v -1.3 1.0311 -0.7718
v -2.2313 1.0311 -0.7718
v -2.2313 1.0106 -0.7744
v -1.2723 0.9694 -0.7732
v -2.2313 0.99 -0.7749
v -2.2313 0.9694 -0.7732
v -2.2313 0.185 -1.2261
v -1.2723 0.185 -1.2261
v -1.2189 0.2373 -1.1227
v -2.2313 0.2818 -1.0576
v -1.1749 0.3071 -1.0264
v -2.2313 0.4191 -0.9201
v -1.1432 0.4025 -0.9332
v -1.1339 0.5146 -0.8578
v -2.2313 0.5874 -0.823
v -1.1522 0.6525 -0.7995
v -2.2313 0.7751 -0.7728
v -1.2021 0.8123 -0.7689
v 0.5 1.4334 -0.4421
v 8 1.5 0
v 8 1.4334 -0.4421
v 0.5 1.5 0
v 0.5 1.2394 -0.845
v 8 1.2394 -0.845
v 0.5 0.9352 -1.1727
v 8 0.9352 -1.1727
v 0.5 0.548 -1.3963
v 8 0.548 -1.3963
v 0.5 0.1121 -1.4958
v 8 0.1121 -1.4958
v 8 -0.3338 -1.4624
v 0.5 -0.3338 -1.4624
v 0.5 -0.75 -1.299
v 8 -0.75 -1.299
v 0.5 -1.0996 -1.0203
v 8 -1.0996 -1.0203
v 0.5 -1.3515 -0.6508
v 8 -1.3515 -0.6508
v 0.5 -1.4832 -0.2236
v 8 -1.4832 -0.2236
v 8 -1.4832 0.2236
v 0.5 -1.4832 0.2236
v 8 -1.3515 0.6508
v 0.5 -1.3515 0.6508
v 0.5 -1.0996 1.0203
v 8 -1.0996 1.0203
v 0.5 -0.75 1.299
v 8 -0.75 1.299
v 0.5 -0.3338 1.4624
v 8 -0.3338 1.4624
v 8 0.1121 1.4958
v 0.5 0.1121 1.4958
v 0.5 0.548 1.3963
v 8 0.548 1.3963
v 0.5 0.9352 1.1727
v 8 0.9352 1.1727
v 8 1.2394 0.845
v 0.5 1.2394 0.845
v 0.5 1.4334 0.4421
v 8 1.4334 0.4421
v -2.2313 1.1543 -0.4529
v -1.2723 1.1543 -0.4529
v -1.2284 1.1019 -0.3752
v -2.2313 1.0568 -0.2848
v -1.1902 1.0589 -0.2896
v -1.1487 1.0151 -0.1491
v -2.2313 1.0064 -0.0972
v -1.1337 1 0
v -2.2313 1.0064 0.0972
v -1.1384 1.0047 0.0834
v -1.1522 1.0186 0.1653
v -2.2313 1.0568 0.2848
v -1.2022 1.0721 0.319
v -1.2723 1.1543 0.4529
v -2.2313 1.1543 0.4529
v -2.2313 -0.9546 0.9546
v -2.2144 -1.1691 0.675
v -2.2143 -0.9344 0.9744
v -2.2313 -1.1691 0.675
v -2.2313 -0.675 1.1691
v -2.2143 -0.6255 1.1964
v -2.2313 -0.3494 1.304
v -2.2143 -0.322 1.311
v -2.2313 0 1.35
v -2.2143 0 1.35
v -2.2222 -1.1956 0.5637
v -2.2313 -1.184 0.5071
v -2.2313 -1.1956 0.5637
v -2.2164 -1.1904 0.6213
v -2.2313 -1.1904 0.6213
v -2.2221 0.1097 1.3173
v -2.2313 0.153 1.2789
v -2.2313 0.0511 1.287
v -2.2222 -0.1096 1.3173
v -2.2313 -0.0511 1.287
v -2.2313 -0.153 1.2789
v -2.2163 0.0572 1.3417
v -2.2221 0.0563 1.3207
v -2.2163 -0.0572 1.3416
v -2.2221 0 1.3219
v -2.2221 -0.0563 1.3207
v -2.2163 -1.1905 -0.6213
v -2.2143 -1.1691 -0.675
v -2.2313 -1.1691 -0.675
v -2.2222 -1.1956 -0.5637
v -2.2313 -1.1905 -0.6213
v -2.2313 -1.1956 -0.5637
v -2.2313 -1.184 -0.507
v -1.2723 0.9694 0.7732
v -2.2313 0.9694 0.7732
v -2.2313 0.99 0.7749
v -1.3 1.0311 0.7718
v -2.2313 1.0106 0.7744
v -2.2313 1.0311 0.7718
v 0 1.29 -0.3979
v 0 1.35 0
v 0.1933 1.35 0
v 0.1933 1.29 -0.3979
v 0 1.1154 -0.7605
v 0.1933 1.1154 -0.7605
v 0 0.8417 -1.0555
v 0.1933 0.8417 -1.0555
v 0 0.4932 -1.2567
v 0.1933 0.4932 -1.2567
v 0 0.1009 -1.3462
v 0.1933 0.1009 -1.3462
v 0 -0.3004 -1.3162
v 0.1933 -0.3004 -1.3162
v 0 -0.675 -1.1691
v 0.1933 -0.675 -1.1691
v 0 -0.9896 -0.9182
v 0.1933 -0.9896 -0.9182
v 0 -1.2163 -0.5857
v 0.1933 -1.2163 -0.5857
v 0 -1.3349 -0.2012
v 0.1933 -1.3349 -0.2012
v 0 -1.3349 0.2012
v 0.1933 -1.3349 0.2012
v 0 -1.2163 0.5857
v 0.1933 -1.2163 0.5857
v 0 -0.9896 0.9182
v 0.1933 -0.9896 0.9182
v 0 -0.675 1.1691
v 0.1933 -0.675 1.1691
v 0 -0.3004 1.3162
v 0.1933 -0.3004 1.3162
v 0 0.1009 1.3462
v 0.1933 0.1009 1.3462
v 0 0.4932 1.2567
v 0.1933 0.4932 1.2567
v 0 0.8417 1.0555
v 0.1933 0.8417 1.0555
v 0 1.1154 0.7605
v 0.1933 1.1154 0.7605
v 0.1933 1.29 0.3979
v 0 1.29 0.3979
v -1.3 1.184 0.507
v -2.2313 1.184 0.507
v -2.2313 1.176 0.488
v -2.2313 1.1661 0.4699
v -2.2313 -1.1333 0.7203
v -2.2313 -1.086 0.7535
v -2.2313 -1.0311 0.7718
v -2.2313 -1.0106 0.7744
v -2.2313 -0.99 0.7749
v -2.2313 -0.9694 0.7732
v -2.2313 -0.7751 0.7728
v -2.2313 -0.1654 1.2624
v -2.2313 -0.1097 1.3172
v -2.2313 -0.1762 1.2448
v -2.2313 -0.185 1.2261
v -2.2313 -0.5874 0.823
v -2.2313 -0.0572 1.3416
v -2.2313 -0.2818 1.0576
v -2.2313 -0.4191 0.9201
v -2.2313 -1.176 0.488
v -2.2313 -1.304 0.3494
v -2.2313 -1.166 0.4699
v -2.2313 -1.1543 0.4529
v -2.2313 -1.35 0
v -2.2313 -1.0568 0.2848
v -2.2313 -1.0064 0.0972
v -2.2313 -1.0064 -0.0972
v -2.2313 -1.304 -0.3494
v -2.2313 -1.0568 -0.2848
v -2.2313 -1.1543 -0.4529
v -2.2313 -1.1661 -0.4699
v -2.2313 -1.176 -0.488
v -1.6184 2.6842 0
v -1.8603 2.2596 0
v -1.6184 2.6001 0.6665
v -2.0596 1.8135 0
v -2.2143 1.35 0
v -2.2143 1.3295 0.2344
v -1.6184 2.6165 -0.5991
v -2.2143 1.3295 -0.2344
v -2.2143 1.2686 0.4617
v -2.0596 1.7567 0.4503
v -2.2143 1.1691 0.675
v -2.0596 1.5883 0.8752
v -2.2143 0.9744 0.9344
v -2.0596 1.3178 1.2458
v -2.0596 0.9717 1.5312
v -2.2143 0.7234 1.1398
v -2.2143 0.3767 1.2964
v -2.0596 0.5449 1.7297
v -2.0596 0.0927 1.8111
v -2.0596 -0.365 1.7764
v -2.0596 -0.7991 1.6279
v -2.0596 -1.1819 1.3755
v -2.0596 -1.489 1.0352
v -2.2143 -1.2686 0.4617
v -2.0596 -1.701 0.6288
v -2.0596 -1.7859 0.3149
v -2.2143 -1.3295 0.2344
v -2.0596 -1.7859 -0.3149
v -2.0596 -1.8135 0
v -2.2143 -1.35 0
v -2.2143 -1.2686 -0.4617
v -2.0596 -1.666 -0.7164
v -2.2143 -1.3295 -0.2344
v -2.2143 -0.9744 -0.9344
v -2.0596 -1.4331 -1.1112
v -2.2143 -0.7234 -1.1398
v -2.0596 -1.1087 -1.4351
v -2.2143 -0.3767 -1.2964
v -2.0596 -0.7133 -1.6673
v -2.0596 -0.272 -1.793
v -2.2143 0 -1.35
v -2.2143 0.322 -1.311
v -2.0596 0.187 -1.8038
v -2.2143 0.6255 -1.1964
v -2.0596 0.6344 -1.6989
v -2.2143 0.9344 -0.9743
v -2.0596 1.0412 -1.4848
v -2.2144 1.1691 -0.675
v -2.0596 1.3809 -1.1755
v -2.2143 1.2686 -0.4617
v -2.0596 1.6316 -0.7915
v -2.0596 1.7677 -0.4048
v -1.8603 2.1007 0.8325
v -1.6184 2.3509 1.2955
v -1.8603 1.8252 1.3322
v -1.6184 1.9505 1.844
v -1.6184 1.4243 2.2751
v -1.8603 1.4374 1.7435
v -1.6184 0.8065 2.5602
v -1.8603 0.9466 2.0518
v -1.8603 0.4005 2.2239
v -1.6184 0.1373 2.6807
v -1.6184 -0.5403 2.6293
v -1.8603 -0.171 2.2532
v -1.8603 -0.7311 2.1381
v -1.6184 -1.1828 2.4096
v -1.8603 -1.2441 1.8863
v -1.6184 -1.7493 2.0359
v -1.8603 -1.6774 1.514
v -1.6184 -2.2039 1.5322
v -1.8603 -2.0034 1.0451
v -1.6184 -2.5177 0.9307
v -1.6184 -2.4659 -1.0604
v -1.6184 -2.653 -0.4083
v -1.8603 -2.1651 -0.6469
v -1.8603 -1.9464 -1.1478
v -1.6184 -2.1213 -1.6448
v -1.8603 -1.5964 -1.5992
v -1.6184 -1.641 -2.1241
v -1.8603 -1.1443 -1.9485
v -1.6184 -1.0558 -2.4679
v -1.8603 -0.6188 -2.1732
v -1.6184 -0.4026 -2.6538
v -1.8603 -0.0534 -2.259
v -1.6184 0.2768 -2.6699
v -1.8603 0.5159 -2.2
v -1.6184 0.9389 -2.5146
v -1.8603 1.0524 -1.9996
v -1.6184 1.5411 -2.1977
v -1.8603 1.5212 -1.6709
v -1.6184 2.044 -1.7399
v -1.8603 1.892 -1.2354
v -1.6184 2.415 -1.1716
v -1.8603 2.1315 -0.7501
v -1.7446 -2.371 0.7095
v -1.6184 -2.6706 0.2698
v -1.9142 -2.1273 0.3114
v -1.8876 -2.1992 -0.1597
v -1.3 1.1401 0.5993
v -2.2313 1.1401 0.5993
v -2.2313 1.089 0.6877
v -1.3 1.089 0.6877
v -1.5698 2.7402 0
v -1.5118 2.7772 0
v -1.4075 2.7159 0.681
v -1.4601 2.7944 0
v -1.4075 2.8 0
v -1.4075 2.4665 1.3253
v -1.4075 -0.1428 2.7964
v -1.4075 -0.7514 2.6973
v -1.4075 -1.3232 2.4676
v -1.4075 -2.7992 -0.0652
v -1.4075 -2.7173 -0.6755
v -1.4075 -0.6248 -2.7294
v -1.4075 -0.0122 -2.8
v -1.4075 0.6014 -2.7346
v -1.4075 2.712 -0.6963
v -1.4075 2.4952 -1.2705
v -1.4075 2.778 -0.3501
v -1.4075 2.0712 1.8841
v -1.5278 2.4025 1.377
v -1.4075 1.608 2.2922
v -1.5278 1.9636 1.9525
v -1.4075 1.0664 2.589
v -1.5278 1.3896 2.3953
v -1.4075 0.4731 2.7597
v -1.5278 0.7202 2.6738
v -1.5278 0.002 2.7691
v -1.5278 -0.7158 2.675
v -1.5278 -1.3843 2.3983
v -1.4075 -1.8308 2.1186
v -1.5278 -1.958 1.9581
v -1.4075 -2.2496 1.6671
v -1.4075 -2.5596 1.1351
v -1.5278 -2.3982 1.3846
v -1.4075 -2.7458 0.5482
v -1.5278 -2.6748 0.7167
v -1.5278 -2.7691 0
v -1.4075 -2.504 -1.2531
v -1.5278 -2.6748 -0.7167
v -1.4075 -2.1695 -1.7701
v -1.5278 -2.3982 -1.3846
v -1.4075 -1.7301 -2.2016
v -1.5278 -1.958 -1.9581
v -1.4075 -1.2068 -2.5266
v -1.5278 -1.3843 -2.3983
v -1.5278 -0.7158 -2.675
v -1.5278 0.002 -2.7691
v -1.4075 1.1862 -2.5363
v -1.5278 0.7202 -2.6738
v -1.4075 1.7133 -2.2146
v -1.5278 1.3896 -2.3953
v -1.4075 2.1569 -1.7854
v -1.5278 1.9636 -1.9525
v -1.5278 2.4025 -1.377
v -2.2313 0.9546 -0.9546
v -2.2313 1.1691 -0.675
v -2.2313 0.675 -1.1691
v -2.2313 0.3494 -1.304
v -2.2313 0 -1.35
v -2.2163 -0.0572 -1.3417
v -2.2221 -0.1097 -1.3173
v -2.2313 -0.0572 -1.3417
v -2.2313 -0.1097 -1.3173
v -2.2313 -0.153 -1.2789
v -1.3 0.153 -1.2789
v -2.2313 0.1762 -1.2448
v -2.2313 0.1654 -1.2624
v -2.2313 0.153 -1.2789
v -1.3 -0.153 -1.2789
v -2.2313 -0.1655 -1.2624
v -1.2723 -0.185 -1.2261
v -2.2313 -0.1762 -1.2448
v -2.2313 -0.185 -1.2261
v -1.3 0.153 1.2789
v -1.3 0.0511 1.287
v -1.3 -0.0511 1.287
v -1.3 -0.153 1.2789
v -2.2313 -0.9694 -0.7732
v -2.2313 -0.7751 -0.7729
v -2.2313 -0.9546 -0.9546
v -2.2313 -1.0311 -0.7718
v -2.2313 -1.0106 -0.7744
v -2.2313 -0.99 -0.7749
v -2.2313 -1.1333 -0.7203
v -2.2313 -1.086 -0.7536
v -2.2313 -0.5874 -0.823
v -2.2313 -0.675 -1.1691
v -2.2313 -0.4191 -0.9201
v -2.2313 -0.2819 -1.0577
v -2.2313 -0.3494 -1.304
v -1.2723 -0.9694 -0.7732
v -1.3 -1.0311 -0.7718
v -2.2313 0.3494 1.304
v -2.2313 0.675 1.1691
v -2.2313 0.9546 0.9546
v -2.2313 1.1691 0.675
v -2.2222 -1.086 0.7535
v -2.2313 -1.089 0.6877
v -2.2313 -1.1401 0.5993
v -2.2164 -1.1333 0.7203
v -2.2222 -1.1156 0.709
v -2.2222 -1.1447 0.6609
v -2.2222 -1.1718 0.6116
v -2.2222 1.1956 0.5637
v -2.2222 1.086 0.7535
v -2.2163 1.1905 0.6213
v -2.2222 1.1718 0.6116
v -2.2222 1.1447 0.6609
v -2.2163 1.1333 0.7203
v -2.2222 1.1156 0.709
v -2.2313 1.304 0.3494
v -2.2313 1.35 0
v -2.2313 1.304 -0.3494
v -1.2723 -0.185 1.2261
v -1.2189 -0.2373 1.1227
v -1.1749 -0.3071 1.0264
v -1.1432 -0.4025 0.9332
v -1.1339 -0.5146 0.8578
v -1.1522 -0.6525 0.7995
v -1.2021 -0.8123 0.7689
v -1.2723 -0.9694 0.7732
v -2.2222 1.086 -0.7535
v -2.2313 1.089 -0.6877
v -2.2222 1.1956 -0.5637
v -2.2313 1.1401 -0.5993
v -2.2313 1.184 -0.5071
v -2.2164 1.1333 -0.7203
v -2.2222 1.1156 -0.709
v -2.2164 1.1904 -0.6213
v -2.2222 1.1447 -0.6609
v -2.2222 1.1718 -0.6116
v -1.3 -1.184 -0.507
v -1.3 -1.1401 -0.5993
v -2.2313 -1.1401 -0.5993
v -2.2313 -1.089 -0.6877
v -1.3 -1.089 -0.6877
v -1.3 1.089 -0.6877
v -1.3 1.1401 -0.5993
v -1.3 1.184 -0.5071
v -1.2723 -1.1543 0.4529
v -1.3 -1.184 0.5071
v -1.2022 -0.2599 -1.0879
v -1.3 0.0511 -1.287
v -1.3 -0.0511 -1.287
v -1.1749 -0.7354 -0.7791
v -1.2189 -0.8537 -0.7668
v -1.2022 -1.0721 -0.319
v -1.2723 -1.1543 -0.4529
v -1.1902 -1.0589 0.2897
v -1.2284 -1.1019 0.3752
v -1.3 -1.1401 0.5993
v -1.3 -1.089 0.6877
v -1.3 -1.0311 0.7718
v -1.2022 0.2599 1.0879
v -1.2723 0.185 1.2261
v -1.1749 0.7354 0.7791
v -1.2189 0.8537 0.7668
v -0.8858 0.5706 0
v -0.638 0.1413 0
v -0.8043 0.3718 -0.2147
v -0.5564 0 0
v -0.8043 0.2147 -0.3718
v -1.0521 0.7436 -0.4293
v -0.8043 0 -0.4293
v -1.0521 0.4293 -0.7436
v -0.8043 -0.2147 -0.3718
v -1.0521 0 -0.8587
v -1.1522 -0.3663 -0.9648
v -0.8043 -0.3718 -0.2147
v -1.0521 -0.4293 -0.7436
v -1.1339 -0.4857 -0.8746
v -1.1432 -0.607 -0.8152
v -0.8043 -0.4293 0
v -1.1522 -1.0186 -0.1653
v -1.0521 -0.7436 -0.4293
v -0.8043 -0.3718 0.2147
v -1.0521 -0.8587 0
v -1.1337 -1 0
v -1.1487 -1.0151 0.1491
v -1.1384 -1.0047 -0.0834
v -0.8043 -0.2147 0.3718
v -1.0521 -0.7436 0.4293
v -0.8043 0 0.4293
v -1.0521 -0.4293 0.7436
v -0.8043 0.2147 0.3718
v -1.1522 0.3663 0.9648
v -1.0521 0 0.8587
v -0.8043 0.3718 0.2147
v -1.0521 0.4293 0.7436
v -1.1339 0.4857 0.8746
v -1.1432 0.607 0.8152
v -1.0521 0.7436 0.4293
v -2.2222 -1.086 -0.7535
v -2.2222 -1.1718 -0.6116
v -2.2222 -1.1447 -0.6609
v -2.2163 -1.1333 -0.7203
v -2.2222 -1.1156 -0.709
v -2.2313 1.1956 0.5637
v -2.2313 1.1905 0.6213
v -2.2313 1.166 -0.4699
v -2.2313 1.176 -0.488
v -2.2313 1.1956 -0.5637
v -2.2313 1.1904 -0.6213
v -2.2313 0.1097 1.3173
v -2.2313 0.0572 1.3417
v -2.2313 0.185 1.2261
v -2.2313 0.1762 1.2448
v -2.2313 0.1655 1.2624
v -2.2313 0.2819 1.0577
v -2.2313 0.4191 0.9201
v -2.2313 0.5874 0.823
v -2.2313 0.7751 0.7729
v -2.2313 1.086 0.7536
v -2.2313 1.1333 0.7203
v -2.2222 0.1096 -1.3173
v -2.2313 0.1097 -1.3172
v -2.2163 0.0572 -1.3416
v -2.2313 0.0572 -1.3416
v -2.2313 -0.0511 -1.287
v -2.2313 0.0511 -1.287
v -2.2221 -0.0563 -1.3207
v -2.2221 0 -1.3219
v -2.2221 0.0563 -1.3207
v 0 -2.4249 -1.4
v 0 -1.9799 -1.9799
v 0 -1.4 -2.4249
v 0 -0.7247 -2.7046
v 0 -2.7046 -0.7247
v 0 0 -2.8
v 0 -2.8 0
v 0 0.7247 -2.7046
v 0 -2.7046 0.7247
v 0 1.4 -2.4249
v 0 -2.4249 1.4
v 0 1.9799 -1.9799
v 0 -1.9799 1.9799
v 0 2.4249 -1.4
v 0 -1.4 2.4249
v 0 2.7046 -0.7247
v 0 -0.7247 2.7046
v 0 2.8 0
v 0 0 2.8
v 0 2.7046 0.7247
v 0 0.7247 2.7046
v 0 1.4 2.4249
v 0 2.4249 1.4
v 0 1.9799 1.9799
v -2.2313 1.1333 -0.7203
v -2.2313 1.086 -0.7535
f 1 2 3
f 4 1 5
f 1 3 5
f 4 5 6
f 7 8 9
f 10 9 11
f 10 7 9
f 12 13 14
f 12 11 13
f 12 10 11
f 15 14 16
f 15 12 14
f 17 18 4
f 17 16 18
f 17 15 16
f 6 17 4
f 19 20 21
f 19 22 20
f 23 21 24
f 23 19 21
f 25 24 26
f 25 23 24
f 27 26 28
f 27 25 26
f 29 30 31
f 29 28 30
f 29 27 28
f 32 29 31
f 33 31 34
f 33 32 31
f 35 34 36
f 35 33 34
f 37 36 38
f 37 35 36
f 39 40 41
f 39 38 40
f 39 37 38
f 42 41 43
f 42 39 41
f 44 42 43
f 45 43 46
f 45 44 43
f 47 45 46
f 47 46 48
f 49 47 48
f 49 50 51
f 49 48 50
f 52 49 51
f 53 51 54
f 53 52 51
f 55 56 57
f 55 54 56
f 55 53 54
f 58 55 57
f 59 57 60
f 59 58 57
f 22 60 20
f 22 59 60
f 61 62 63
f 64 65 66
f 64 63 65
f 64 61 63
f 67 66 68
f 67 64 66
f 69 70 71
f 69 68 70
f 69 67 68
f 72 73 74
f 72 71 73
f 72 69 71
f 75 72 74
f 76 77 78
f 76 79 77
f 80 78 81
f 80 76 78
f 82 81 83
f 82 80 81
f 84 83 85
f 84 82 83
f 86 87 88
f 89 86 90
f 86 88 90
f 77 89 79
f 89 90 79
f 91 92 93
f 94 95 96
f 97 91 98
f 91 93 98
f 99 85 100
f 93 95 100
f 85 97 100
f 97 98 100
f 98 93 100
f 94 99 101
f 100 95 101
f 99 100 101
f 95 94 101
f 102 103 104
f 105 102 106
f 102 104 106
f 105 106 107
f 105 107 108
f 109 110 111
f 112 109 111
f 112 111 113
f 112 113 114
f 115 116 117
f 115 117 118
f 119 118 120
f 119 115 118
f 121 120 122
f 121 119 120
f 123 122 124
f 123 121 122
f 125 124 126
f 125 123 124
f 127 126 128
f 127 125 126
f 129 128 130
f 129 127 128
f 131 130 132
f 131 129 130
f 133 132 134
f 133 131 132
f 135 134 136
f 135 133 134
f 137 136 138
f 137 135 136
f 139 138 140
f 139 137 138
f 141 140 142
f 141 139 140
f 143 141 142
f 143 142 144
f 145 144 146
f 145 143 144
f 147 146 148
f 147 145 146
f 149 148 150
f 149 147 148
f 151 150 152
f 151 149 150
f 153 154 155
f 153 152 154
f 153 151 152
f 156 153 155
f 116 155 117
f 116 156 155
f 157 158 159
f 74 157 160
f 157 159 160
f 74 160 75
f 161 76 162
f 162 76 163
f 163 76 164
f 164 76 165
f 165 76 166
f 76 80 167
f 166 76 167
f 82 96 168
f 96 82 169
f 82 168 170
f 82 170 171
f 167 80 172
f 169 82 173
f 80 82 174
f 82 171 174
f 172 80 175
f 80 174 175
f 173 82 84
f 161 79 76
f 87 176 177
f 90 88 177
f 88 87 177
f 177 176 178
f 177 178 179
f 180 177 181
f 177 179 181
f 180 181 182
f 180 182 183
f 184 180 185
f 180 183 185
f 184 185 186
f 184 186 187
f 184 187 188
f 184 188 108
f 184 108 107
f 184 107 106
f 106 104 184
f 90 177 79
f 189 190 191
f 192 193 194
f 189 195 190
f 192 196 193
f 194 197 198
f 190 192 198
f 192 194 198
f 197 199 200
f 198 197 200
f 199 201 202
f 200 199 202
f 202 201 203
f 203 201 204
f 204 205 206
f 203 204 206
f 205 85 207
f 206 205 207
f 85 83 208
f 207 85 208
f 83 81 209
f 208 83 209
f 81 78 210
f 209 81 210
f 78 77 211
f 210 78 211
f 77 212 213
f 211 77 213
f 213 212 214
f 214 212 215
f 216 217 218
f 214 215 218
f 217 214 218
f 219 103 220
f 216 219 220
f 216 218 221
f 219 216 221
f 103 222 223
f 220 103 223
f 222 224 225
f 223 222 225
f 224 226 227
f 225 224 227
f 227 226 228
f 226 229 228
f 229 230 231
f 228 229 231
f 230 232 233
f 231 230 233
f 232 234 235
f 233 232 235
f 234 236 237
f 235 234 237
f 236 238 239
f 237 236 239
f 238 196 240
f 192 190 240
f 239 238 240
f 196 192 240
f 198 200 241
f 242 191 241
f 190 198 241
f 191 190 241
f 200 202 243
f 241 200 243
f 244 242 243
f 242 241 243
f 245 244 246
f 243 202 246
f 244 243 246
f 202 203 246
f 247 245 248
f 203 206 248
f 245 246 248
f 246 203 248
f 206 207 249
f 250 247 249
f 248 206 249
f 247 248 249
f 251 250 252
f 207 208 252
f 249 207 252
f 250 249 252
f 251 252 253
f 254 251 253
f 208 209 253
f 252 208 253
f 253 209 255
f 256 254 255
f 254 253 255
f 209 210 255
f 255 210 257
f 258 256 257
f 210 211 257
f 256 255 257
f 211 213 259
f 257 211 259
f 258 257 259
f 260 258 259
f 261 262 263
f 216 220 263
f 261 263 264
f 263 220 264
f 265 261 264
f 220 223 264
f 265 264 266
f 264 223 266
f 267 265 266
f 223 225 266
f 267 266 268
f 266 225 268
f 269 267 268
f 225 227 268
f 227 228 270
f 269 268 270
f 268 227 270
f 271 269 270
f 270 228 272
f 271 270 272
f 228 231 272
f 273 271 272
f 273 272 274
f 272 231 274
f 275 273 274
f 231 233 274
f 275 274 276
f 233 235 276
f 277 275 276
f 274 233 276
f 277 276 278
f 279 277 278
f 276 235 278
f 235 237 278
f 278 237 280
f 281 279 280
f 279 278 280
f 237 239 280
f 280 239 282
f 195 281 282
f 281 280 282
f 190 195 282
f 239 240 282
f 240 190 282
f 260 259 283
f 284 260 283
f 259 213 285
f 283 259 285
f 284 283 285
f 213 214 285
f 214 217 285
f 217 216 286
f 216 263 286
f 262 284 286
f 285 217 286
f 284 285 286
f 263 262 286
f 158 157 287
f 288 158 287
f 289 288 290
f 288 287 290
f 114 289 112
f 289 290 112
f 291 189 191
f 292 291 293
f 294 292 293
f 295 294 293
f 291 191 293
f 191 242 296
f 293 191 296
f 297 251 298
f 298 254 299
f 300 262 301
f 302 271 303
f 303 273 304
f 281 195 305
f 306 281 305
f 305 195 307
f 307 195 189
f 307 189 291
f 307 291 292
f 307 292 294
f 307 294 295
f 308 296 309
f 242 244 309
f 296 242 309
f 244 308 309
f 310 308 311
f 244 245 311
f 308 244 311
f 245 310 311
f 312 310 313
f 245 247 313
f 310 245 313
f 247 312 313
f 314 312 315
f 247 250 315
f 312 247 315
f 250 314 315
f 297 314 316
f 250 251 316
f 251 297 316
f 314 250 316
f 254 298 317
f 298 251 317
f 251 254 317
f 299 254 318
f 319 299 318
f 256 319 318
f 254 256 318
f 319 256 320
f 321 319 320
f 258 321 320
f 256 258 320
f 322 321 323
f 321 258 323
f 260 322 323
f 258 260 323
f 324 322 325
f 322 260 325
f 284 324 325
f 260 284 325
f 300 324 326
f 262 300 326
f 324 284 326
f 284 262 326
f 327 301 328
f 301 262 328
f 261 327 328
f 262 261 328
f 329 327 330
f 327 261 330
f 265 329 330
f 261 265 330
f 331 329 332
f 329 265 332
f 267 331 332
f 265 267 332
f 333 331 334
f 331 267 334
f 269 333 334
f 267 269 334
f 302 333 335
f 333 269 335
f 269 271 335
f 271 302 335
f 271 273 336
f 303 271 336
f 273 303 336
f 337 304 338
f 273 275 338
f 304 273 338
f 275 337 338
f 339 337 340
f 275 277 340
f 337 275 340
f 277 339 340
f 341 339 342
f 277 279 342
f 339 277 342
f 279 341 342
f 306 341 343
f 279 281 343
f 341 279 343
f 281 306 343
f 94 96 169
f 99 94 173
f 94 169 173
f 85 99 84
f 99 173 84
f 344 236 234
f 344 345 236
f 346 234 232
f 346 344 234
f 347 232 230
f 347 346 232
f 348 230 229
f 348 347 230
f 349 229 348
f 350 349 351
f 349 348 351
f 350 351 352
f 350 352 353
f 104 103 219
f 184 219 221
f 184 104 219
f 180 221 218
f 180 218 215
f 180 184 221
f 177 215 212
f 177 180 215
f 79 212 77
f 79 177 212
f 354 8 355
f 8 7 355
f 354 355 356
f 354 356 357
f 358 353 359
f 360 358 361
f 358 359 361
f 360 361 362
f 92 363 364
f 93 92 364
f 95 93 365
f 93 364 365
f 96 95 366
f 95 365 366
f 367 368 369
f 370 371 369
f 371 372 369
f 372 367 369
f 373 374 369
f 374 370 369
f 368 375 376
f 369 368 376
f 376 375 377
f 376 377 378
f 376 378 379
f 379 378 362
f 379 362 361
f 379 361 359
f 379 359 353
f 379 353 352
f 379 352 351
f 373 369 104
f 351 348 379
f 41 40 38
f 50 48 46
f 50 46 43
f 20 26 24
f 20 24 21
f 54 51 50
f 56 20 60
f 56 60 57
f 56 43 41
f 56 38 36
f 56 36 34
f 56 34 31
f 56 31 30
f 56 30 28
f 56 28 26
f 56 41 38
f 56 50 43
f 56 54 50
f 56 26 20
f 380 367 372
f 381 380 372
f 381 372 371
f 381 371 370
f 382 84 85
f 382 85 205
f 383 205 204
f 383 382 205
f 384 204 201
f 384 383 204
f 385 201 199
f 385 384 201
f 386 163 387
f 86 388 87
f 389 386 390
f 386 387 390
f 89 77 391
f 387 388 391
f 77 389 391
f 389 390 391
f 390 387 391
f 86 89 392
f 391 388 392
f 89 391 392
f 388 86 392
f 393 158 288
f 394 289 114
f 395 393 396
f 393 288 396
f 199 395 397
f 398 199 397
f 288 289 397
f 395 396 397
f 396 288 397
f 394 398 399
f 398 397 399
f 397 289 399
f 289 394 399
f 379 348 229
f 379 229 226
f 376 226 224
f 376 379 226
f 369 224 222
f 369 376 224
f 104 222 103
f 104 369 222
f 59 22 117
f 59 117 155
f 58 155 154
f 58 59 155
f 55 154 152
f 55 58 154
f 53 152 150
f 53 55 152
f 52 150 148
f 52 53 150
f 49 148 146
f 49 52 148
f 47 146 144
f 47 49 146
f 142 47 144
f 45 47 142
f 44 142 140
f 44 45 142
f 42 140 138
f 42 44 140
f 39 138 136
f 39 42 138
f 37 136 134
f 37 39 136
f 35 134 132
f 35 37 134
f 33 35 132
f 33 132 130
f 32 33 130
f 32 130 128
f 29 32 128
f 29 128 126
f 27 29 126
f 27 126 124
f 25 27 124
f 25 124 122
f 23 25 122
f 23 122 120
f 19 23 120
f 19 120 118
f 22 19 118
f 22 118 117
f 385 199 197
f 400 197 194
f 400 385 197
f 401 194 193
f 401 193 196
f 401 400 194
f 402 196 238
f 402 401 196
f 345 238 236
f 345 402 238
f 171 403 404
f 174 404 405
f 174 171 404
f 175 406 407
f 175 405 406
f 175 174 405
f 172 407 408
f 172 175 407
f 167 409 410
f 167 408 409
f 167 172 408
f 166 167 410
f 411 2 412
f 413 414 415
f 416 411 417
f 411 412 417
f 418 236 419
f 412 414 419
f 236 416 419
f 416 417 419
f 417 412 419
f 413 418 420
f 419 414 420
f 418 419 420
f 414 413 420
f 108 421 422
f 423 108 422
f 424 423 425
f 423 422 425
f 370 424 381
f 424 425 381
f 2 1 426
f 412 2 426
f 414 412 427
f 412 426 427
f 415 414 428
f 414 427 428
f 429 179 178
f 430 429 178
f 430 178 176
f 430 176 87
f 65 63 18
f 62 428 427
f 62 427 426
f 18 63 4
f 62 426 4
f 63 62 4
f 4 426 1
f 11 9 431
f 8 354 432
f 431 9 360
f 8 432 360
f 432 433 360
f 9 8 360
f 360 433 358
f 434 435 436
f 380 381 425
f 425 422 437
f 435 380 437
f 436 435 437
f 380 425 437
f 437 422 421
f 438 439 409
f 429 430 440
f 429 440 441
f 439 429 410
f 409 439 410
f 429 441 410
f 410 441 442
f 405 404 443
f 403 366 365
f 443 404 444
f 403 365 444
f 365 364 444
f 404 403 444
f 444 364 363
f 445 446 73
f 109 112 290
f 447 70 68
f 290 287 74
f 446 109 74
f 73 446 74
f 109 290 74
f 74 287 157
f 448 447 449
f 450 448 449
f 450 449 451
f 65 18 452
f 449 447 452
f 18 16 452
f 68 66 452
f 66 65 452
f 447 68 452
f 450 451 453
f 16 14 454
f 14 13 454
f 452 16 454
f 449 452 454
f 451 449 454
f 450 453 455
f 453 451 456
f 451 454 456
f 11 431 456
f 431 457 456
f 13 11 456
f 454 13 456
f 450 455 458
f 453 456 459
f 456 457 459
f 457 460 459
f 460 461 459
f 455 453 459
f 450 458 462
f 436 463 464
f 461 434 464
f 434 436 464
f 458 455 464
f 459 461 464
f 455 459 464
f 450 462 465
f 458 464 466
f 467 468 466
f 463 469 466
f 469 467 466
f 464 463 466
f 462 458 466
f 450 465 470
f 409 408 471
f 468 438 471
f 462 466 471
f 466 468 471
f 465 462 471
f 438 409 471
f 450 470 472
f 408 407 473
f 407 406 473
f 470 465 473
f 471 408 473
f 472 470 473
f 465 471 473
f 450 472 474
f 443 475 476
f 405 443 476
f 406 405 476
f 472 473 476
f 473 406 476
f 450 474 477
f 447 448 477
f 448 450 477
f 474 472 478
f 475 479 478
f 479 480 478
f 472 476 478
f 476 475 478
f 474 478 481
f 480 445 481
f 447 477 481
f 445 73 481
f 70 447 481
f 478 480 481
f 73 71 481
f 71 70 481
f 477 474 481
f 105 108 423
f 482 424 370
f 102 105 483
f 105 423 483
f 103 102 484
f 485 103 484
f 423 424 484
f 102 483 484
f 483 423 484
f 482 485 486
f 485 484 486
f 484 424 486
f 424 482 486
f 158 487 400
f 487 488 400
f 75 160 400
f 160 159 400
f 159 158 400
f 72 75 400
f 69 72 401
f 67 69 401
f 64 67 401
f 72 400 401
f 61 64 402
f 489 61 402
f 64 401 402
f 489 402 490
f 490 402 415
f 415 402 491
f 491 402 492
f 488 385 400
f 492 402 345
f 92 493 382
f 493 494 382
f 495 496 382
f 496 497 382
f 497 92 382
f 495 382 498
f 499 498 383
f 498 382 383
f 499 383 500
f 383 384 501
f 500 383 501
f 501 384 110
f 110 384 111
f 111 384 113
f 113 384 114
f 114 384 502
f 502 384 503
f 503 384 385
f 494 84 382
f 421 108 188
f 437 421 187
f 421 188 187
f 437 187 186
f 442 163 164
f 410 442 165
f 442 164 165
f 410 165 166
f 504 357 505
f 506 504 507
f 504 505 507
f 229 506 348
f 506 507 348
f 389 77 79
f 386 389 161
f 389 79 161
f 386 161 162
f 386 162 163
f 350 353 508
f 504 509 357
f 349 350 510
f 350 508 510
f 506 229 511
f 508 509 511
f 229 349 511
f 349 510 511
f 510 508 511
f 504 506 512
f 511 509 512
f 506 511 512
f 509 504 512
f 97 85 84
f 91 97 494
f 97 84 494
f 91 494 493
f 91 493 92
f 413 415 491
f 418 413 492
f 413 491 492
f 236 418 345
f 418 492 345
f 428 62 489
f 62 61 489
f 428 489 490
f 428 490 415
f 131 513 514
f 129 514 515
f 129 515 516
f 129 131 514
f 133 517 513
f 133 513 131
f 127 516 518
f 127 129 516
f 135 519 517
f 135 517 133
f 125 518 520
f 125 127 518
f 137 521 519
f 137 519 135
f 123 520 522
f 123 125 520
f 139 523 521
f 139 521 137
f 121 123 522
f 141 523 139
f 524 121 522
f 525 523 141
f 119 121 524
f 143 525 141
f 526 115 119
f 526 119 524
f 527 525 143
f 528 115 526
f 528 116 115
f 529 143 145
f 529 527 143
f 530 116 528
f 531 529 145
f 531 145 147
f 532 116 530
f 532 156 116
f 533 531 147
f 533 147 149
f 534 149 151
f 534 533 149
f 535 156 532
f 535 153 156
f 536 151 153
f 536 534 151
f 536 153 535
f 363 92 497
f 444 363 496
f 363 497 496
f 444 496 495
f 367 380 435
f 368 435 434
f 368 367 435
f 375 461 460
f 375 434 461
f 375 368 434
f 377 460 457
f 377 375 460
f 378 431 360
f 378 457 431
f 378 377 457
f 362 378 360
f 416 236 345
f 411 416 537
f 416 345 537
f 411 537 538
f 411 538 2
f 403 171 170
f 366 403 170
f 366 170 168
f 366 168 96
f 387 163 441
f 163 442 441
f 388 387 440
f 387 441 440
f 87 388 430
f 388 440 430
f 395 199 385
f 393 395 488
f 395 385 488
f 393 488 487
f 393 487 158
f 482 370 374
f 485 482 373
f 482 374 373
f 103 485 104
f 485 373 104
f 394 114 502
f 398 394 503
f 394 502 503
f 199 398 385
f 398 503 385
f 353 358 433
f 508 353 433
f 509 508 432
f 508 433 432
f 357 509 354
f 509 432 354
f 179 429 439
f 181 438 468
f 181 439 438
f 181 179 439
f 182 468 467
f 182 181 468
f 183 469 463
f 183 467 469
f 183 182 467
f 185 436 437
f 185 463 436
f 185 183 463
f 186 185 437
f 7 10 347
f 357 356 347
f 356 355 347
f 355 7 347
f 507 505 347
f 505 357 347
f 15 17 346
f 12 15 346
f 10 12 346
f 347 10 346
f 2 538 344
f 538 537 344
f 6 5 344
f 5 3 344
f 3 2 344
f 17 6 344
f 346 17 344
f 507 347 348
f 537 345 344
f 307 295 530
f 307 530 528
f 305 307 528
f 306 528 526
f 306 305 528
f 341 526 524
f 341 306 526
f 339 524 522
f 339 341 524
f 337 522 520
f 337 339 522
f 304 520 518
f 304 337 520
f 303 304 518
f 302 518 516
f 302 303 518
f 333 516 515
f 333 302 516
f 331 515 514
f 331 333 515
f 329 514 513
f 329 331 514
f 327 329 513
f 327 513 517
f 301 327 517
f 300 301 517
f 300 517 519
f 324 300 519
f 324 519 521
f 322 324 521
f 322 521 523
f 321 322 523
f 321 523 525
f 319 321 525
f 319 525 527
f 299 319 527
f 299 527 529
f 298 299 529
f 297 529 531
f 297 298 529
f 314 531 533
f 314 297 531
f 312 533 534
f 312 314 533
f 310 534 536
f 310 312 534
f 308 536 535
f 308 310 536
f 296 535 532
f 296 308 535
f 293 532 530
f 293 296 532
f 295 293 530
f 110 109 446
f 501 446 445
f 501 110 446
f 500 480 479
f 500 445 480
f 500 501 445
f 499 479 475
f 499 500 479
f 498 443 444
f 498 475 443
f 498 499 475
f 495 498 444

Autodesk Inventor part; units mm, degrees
ref_plane "YZ Plane" through (0, 0, 0) normal (1, 0, 0) x (0, 1, 0)
sketch "Sketch1" plane through (0, 0, 0) normal (0, 0, 1) x (1, 0, 0)
  line L0 (-0.5564, 0) -> (8, 0)
  line L1 (8, 0) -> (8, 1.5)
  line L2 (8, 1.5) -> (0.5, 1.5)
  line L3 (0.5, 1.5) -> (0.1933, 1.35)
  line L4 (0.1933, 1.35) -> (0, 1.35)
  line L5 (0, 1.35) -> (0, 2.8)
  line L6 (0, 2.8) -> (-1.5425, 2.8)
  arc A0 (-1.5425, 2.8) -> (-2.2313, 1.288) centre (2.6, 0) ccw
  line L7 (-2.2313, 1.288) -> (-1.3, 1.288)
  line L8 (-1.3, 1.288) -> (-0.5564, 0)
  arc A1 (-2.2313, 1.288) -> (-2.4, 0) centre (2.6, 0) ccw construction
  line L9 (-2.4, 0) -> (-0.5564, 0) construction
  line L10 (-4.5304, 0) -> (10.0884, 0) projected
  line L11 (0, -0.5658) -> (0, 3.3946) projected
  line L12 (0.5, 1.5) -> (0, 1.5) construction
  dimension "d0" = 8
  dimension "d1" = 7.5
  dimension "d2" = 0.3067
  dimension "d3" = 2.4
  dimension "d4" = 1.1
  dimension "d5" = 60
  dimension "d6" = 3
  dimension "d7" = 5.6
  dimension "d8" = 0
  dimension "d9" = 2.576
  dimension "d10" = 2.7
  dimension "d11" = 5
  dimension "d21" = 0.1687
revolve "Body" add sketch "Sketch1" angle 360 about axis through (-0.5564, 0, 0) along (1, 0, 0)
ref_plane "IDS_WORKPLANE{1}" through (-2.2313, 0, 0) normal (1, 0, 0) x (0, 0, -1)
sketch "Sketch2" plane through (-2.2313, 0, 0) normal (1, 0, 0) x (0, 0, -1)
  line L0 (0, -4.1335) -> (0, 5.2012) projected
  line L1 (5.1441, 0) -> (-4.124, 0) projected
  circle A0 centre (0, 0) radius 1 construction
  line L2 (0, 0) -> (2.233, 3.8677) construction
  line L3 (0, 0) -> (3.8201, 2.2055) construction
  arc A1 (1.35, 0) -> (1.2261, 0.185) centre (1.15, 0) ccw
  arc A2 (0.7732, 0.9694) -> (0.4529, 1.1543) centre (0.575, 0.9959) ccw
  arc A3 (0.7732, 0.9694) -> (1.2261, 0.185) centre (1.5084, 0.8709) ccw
  arc A4 (-0.4529, 1.1543) -> (-0.7732, 0.9694) centre (-0.575, 0.9959) ccw
  arc A5 (-0.4529, 1.1543) -> (0.4529, 1.1543) centre (0, 1.7417) ccw
  arc A6 (-1.2261, 0.185) -> (-1.35, 0) centre (-1.15, 0) ccw
  arc A7 (-1.2261, 0.185) -> (-0.7732, 0.9694) centre (-1.5084, 0.8709) ccw
  arc A8 (1.2261, -0.185) -> (1.35, 0) centre (1.15, 0) ccw
  arc A9 (0.4529, -1.1543) -> (0.7732, -0.9694) centre (0.575, -0.9959) ccw
  arc A10 (1.2261, -0.185) -> (0.7732, -0.9694) centre (1.5084, -0.8709) ccw
  arc A11 (-0.7732, -0.9694) -> (-0.4529, -1.1543) centre (-0.575, -0.9959) ccw
  arc A12 (0.4529, -1.1543) -> (-0.4529, -1.1543) centre (0, -1.7417) ccw
  arc A13 (-0.7732, -0.9694) -> (-1.2261, -0.185) centre (-1.5084, -0.8709) ccw
  arc A14 (-1.35, 0) -> (-1.2261, -0.185) centre (-1.15, 0) ccw
  circle A15 centre (0, 0) radius 1.35
  circle A16 centre (0, 0) radius 1.35 projected
  dimension "d14" = 2
  dimension "d15" = 30
  dimension "d16" = 60
  dimension "d27" = 0.2
  dimension "d28" = 0.2
extrude "Slot" add sketch "Sketch2" along normal up to next contours A15 A11 A12 L0 | A15 A4 A7 A6 | A15 A9 A10 A8 | L0 A12 A9 A15 | A15 A14 A13 A11 | A1 A3 A2 A15 | A5 A4 A15 L0 | L0 A15 A2 A5
fillet "Fillet1" radius 0.25 1 edges at (-1.5425, -2.8, 0)
thread "Thread" size "M3x0.5" class "6g" standard "ISO Metric profile" length 7.5
ref_plane "Work Plane2" through (25, 0, 0) normal (0, 0.5, -0.866) x (1, 0, 0)
equation "\"d0\" = NLG"
equation "\"d1\" = GEL"
equation "\"d2\" = GAL"
equation "\"d3\" = KOH"
equation "\"d4\" = INTI"
equation "\"d6\" = GD"
equation "\"d7\" = KOD"
equation "\"d9\" = E0"
equation "\"d10\" = BDM"
equation "\"d11\" = KR"
equation "\"d14\" = SW"
equation "\"d27\" = RRK"
equation "\"d28\" = RRK"
equation "\"d18\" = RR"
equation "\"d20\" = GEL"
equation "\"GD\" = NND"
equation "\"NLG\" = 8"
equation "\"GEL\" = 7.5"
equation "\"KOD\" = 5.6"
equation "\"KOH\" = 2.4"
equation "\"INTI\" = 1.1"
equation "\"GAL\" = 0.61345 * PTC"
equation "\"KR\" = 5"
equation "\"BDM\" = 2.7"
equation "\"KEWI\" = 0"
equation "\"SW\" = 2"
equation "\"d13\" = -KOH + d21"
equation "\"RR\" = 0.25"
equation "\"RRK\" = 0.2"
equation "\"E0\" = 2.576"
equation "\"GUL\" = 0.61345 * PTC"
equation "\"SPD\" = NND - 1.2269 * GAL"
equation "\"PHH\" = 0"
equation "\"GD1\" = THREADDIA - 1.2269 * PTC"
equation "\"THREADDIA\" = 3"
equation "\"FAWI\" = 90deg"
equation "\"ANG\" = 120deg"
equation "\"PTC\" = 0.5"
equation "\"NND\" = 3"
equation "\"TOA\" = 30deg"
properties part number "NF E 25-109 - M3 x 8" material "Steel, Mild"
